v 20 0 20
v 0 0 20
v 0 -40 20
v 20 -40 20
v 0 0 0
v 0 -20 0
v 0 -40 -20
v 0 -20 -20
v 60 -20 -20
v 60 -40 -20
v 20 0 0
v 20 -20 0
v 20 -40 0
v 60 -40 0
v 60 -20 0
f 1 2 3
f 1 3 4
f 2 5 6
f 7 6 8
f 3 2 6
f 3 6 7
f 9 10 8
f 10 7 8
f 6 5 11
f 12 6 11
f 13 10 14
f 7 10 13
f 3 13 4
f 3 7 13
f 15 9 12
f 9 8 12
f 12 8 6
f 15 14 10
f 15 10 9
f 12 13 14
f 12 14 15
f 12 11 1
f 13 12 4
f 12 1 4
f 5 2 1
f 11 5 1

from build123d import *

# Parameters (mm, degrees)
F0_W     = 20
F0_H     = 20
F1_DEPTH = 40
F2_W     = 20
F2_H     = 20
F3_DEPTH = 20
F4_W     = 20
F4_H     = 20
F5_DEPTH = 40


with BuildPart() as f1:
    # F0 (on Front) → F1 (new body)
    with BuildSketch(Plane.XZ):
        with Locations((10, 10)):
            Rectangle(F0_W, F0_H)
    extrude(amount=F1_DEPTH)

    # F2 (on face) → F3 (join)
    with BuildSketch(Plane(origin=(0, 0, 0), x_dir=(1, 0, 0), z_dir=(0, 0, -1))):
        with Locations((10, 30)):
            Rectangle(F2_W, F2_H)
    extrude(amount=F3_DEPTH)

    # F4 (on face) → F5 (join)
    with BuildSketch(Plane.YZ.offset(20)):
        with Locations((-30, -10)):
            Rectangle(F4_W, F4_H)
    extrude(amount=F5_DEPTH)


solid = f1.part
